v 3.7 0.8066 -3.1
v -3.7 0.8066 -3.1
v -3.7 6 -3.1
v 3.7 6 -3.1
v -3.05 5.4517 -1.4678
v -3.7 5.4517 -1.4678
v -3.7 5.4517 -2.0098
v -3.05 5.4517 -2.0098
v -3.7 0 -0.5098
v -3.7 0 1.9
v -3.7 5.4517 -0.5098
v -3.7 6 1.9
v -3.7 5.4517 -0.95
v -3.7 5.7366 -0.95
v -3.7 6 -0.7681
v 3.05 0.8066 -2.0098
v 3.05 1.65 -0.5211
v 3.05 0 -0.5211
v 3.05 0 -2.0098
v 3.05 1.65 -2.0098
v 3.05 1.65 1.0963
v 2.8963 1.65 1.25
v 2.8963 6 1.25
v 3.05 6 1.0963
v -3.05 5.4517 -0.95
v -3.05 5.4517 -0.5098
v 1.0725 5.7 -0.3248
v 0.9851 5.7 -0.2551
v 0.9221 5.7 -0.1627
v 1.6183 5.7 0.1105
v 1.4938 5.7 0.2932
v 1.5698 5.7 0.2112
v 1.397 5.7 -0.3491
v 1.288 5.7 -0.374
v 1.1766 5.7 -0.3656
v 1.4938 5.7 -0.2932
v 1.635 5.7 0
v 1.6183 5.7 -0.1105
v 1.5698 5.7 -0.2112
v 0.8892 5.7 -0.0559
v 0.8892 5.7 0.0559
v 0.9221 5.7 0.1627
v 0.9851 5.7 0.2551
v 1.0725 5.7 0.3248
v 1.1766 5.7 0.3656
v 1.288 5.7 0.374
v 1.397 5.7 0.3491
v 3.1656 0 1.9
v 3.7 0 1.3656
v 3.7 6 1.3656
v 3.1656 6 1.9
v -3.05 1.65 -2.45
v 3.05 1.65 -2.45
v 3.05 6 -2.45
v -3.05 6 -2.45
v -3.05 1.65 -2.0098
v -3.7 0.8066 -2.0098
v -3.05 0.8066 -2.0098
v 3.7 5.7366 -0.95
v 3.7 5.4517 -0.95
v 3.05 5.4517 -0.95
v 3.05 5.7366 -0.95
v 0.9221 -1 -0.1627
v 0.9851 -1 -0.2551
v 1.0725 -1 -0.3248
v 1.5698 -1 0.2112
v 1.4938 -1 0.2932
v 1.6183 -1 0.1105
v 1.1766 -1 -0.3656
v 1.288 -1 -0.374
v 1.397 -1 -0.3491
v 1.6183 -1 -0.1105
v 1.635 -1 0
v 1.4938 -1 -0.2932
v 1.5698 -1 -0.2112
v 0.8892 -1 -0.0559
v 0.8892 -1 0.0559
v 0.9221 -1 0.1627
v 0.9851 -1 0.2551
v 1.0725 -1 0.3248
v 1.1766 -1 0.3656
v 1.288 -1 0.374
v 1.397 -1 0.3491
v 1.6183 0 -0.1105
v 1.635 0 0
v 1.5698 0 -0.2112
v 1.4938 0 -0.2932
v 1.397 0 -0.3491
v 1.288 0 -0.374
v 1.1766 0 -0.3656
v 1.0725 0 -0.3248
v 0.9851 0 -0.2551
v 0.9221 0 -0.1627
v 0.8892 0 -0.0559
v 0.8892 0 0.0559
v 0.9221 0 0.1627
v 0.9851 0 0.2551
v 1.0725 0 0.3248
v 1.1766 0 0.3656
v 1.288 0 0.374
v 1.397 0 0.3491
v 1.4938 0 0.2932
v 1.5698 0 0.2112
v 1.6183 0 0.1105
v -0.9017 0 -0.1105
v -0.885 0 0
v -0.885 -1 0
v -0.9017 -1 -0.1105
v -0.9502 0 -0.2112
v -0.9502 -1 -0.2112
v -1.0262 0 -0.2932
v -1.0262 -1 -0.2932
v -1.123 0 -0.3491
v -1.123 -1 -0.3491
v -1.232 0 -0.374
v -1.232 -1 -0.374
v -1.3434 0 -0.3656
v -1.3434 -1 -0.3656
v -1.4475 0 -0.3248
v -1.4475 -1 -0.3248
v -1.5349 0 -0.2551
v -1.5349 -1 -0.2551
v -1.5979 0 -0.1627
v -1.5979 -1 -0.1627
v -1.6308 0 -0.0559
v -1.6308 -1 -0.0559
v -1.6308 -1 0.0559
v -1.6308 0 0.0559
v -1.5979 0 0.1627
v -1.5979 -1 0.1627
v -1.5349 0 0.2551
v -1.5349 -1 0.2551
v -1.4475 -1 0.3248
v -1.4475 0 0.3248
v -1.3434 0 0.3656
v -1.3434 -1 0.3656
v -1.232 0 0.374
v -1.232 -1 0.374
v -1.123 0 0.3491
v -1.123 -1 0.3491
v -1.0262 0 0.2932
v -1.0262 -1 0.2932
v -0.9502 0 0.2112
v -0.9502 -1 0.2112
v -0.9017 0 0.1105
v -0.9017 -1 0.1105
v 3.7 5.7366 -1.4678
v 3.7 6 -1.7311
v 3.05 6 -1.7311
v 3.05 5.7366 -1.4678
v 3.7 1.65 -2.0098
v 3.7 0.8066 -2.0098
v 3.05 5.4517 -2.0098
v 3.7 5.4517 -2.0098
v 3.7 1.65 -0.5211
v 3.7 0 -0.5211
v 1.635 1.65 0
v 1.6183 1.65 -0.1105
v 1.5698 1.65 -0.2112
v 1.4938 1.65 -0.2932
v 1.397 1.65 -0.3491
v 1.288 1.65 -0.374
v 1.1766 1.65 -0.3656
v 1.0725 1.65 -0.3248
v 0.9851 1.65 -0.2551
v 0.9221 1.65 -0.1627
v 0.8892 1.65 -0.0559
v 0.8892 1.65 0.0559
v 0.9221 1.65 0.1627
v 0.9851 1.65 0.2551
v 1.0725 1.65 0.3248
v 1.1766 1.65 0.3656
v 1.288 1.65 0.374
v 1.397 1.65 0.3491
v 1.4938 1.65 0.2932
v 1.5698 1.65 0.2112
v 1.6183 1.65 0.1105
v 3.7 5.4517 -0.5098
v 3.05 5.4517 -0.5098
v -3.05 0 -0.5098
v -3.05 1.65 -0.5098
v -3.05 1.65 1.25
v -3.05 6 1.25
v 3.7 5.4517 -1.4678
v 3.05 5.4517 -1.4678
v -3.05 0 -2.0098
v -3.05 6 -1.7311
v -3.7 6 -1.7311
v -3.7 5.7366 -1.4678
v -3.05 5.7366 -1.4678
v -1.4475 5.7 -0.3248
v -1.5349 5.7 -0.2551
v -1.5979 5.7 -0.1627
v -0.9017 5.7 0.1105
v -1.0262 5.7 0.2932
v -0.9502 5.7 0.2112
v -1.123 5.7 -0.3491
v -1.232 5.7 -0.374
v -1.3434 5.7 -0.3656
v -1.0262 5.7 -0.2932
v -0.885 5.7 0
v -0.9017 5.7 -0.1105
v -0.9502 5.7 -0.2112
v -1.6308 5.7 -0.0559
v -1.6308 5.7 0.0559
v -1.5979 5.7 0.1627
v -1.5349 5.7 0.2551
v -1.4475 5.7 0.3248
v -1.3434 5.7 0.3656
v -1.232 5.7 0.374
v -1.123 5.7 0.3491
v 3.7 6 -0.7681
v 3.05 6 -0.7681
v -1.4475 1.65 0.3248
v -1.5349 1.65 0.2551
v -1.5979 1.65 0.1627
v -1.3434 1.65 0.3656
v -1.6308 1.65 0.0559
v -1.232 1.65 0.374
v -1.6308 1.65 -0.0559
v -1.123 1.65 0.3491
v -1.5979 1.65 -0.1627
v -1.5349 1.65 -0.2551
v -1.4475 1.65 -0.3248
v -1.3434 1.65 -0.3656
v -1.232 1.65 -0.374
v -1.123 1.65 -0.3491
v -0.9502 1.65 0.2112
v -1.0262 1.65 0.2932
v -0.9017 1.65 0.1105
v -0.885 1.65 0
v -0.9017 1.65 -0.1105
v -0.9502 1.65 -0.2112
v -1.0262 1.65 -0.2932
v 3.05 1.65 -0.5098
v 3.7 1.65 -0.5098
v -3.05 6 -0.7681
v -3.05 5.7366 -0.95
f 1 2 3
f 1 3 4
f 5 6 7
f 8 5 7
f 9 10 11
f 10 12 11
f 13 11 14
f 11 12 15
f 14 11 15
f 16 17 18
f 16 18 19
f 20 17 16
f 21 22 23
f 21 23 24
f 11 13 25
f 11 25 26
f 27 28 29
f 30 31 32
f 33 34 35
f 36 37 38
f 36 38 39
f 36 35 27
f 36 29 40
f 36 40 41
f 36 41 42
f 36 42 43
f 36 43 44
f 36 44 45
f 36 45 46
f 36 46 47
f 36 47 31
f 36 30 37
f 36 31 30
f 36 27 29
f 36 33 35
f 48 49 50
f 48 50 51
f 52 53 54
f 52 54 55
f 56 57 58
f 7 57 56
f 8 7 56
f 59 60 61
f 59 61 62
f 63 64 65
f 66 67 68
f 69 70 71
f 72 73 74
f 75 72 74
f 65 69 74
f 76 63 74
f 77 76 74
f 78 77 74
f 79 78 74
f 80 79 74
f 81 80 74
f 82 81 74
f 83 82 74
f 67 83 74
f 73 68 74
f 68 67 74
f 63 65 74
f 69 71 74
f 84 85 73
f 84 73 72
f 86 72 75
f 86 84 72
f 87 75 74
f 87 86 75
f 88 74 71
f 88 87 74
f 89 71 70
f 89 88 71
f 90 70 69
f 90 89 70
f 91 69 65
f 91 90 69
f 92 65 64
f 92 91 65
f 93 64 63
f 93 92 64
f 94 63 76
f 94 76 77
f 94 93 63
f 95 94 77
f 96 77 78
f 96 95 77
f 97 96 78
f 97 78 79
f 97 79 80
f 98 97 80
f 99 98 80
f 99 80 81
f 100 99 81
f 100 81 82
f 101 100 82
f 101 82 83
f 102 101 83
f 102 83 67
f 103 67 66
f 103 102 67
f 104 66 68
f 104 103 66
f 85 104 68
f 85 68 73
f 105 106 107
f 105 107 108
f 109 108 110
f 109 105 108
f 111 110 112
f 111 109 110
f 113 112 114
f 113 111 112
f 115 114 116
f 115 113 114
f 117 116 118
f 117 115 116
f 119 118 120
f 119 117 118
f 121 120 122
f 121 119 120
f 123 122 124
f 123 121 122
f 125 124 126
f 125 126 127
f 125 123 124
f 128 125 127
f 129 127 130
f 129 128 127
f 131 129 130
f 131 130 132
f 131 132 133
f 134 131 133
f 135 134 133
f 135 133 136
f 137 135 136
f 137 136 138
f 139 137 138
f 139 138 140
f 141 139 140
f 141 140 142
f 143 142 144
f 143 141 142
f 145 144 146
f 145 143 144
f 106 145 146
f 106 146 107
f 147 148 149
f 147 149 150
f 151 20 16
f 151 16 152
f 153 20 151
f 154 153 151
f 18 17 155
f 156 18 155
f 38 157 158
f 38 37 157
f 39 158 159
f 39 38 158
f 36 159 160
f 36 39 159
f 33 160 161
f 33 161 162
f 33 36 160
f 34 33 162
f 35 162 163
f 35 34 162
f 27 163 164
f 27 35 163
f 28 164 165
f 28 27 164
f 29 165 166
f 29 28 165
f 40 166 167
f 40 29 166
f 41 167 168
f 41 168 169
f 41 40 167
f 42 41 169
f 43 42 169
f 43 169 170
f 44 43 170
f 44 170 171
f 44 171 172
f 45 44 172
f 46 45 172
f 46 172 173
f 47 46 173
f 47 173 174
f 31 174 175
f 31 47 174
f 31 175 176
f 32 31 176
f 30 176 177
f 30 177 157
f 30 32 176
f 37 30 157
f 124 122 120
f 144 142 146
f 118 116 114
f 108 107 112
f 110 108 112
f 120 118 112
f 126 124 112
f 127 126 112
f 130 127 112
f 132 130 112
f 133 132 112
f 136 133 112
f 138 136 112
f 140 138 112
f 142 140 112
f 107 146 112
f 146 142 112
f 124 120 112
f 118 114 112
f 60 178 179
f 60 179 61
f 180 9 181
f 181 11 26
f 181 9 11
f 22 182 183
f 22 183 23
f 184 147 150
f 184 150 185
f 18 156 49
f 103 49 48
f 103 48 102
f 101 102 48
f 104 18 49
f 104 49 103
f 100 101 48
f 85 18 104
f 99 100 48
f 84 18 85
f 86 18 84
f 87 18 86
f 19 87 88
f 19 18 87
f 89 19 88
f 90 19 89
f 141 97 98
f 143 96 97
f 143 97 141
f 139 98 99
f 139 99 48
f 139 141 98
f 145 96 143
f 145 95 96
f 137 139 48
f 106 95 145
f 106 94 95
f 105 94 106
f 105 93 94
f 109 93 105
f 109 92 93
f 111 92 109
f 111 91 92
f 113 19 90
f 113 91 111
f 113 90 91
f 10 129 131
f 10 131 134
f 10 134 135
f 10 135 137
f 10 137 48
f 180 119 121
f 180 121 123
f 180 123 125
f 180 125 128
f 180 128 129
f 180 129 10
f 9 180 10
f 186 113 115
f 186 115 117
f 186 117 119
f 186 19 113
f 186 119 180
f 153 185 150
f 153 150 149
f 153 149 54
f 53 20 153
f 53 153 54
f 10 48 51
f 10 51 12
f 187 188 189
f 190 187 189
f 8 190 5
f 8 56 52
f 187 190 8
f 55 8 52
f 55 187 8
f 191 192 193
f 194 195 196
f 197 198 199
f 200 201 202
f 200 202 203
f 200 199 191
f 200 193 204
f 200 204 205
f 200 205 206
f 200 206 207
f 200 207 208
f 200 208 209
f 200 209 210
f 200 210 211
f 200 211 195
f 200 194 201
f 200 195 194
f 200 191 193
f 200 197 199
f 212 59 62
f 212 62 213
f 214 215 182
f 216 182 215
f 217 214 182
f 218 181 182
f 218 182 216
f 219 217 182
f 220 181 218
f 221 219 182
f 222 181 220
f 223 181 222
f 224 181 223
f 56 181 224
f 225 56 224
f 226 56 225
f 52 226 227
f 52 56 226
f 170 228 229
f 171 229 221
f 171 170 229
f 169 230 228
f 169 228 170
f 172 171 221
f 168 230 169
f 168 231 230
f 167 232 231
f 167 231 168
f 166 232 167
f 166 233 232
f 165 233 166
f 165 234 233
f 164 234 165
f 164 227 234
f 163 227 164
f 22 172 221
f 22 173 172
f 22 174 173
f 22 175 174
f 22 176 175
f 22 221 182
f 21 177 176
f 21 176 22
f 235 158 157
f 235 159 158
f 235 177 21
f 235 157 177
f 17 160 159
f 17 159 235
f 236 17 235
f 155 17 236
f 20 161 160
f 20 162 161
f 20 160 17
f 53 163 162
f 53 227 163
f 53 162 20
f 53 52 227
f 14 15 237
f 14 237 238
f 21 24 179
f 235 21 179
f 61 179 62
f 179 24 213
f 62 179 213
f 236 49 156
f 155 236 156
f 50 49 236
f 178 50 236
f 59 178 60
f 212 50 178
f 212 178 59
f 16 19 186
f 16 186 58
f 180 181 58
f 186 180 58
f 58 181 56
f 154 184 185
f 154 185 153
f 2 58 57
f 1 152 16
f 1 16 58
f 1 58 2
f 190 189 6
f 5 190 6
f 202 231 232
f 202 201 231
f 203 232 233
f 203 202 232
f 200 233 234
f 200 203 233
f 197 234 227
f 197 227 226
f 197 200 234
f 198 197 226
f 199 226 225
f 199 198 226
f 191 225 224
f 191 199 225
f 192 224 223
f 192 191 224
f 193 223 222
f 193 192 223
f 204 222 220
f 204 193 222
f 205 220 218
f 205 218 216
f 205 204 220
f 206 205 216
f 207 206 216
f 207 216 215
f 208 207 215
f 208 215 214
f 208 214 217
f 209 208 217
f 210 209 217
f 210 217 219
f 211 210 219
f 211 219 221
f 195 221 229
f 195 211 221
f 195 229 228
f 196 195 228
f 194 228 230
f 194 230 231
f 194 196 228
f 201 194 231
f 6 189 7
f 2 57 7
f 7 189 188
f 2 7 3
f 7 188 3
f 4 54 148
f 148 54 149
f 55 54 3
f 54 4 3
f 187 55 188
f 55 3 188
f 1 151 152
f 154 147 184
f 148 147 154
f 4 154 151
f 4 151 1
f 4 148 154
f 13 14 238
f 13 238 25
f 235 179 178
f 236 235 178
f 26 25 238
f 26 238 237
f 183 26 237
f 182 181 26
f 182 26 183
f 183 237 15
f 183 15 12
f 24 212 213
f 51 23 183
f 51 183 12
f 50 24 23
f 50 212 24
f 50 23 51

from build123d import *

# Parameters (mm, degrees)
SKETCH1_R                  = 0.375
BOSS_EXTRUDE1_DEPTH        = 5.7
BOSS_EXTRUDE1_DEPTH_BACK   = 1
BOSS_EXTRUDE1_2_DEPTH      = 5.7
BOSS_EXTRUDE1_2_DEPTH_BACK = 1
BOSS_EXTRUDE2_DEPTH        = 1.65
BOSS_EXTRUDE4_DEPTH        = 6
SKETCH5_W                  = 8.470715742
SKETCH5_H                  = 1.5
CUT_EXTRUDE1_DEPTH         = 4.35
BOSS_EXTRUDE5_DEPTH        = 0.65
BOSS_EXTRUDE6_DEPTH        = 0.65
SKETCH8_W                  = 1.741902436
SKETCH8_H                  = 1.335943606
CUT_EXTRUDE2_DEPTH         = 4.7
CUT_EXTRUDE2_DEPTH_BACK    = 4.7
SKETCH10_W                 = 0.65
SKETCH10_H                 = 1.488696467
SKETCH10_H_2               = 1.5
CUT_EXTRUDE3_DEPTH         = 10


with BuildPart() as part:
    # Sketch1 → Boss-Extrude1 (new body, two sides)
    with BuildSketch(Plane(origin=(0, 0, 0), x_dir=(1, 0, 0), z_dir=(0, 1, 0))) as boss_extrude1_sk:
        with Locations((-1.26, 0)):
            Circle(SKETCH1_R)
    extrude(amount=BOSS_EXTRUDE1_DEPTH)
    extrude(boss_extrude1_sk.sketch, amount=-BOSS_EXTRUDE1_DEPTH_BACK)



with BuildPart() as body_2:
    # Sketch1 → Boss-Extrude1 2 (new body, two sides)
    with BuildSketch(Plane(origin=(0, 0, 0), x_dir=(1, 0, 0), z_dir=(0, 1, 0))) as boss_extrude1_2_sk:
        with Locations((1.26, 0)):
            Circle(SKETCH1_R)
    extrude(amount=BOSS_EXTRUDE1_2_DEPTH)
    extrude(boss_extrude1_2_sk.sketch, amount=-BOSS_EXTRUDE1_2_DEPTH_BACK)


with BuildPart() as part_1:
    add(part.part)

    add(body_2.part)  # Boss-Extrude2 merges body 2
    # Sketch2 → Boss-Extrude2 (add)
    with BuildSketch(Plane(origin=(0, 0, 0), x_dir=(1, 0, 0), z_dir=(0, 1, 0))):
        Polygon((3.7, -1.365567335), (3.165567335, -1.9), (-3.7, -1.9), (-3.7, 3.1), (3.7, 3.1), align=None)
    extrude(amount=BOSS_EXTRUDE2_DEPTH)

    # Sketch4 → Boss-Extrude4 (add)
    with BuildSketch(Plane(origin=(0, 0, 0), x_dir=(1, 0, 0), z_dir=(0, 1, 0))):
        Polygon((3.165567335, -1.9), (3.7, -1.365567335), (3.7, 3.1), (-3.7, 3.1), (-3.7, -1.9), align=None)
        Polygon((-3.05, -1.25), (2.89632852, -1.25), (3.05, -1.09632852), (3.05, 2.45), (-3.05, 2.45), align=None, mode=Mode.SUBTRACT)
    extrude(amount=BOSS_EXTRUDE4_DEPTH)

    # Sketch5 → Cut-Extrude1 (cut)
    with BuildSketch(Plane(origin=(0, 6, 0), x_dir=(1, 0, 0), z_dir=(0, 1, 0))):
        with Locations((0, 1.259795506)):
            Rectangle(SKETCH5_W, SKETCH5_H)
    extrude(amount=-CUT_EXTRUDE1_DEPTH, mode=Mode.SUBTRACT)

    # Sketch6 → Boss-Extrude5 (add)
    with BuildSketch(Plane.ZY.offset(3.7)):
        Polygon((-2.009795506, 6), (-1.731148103, 6), (-1.467778214, 5.736630111), (-1.467778214, 5.451734295), (-2.009795506, 5.451734295), align=None)
        Polygon((-0.509795506, 6), (-0.768050416, 6), (-0.950007845, 5.736630111), (-0.950007845, 5.451734295), (-0.509795506, 5.451734295), align=None)
    extrude(amount=-BOSS_EXTRUDE5_DEPTH)

    # Sketch7 → Boss-Extrude6 (add)
    with BuildSketch(Plane(origin=(3.7, 0, 0), x_dir=(0, 0, -1), z_dir=(1, 0, 0))):
        Polygon((0.768050416, 6), (0.509795506, 6), (0.509795506, 5.451734295), (0.950007845, 5.451734295), (0.950007845, 5.736630111), align=None)
        Polygon((2.009795506, 6), (1.731148103, 6), (1.467778214, 5.736630111), (1.467778214, 5.451734295), (2.009795506, 5.451734295), align=None)
    extrude(amount=-BOSS_EXTRUDE6_DEPTH)

    # Sketch8 → Cut-Extrude2 (cut, two sides)
    with BuildSketch(Plane(origin=(0, 0, 0), x_dir=(0, 0, -1), z_dir=(1, 0, 0))) as cut_extrude2_sk:
        with Locations((2.880746724, 0.138578557)):
            Rectangle(SKETCH8_W, SKETCH8_H)
    extrude(amount=CUT_EXTRUDE2_DEPTH, mode=Mode.SUBTRACT)
    extrude(cut_extrude2_sk.sketch, amount=-CUT_EXTRUDE2_DEPTH_BACK, mode=Mode.SUBTRACT)

    # Sketch10 → Cut-Extrude3 (cut)
    with BuildSketch(Plane(origin=(0, 1.65, 0), x_dir=(1, 0, 0), z_dir=(0, 1, 0))):
        with Locations((3.375, 1.265447273)):
            Rectangle(SKETCH10_W, SKETCH10_H)
        with Locations((-3.375, 1.259795506)):
            Rectangle(SKETCH10_W, SKETCH10_H_2)
    extrude(amount=-CUT_EXTRUDE3_DEPTH, mode=Mode.SUBTRACT)


solid = part_1.part
